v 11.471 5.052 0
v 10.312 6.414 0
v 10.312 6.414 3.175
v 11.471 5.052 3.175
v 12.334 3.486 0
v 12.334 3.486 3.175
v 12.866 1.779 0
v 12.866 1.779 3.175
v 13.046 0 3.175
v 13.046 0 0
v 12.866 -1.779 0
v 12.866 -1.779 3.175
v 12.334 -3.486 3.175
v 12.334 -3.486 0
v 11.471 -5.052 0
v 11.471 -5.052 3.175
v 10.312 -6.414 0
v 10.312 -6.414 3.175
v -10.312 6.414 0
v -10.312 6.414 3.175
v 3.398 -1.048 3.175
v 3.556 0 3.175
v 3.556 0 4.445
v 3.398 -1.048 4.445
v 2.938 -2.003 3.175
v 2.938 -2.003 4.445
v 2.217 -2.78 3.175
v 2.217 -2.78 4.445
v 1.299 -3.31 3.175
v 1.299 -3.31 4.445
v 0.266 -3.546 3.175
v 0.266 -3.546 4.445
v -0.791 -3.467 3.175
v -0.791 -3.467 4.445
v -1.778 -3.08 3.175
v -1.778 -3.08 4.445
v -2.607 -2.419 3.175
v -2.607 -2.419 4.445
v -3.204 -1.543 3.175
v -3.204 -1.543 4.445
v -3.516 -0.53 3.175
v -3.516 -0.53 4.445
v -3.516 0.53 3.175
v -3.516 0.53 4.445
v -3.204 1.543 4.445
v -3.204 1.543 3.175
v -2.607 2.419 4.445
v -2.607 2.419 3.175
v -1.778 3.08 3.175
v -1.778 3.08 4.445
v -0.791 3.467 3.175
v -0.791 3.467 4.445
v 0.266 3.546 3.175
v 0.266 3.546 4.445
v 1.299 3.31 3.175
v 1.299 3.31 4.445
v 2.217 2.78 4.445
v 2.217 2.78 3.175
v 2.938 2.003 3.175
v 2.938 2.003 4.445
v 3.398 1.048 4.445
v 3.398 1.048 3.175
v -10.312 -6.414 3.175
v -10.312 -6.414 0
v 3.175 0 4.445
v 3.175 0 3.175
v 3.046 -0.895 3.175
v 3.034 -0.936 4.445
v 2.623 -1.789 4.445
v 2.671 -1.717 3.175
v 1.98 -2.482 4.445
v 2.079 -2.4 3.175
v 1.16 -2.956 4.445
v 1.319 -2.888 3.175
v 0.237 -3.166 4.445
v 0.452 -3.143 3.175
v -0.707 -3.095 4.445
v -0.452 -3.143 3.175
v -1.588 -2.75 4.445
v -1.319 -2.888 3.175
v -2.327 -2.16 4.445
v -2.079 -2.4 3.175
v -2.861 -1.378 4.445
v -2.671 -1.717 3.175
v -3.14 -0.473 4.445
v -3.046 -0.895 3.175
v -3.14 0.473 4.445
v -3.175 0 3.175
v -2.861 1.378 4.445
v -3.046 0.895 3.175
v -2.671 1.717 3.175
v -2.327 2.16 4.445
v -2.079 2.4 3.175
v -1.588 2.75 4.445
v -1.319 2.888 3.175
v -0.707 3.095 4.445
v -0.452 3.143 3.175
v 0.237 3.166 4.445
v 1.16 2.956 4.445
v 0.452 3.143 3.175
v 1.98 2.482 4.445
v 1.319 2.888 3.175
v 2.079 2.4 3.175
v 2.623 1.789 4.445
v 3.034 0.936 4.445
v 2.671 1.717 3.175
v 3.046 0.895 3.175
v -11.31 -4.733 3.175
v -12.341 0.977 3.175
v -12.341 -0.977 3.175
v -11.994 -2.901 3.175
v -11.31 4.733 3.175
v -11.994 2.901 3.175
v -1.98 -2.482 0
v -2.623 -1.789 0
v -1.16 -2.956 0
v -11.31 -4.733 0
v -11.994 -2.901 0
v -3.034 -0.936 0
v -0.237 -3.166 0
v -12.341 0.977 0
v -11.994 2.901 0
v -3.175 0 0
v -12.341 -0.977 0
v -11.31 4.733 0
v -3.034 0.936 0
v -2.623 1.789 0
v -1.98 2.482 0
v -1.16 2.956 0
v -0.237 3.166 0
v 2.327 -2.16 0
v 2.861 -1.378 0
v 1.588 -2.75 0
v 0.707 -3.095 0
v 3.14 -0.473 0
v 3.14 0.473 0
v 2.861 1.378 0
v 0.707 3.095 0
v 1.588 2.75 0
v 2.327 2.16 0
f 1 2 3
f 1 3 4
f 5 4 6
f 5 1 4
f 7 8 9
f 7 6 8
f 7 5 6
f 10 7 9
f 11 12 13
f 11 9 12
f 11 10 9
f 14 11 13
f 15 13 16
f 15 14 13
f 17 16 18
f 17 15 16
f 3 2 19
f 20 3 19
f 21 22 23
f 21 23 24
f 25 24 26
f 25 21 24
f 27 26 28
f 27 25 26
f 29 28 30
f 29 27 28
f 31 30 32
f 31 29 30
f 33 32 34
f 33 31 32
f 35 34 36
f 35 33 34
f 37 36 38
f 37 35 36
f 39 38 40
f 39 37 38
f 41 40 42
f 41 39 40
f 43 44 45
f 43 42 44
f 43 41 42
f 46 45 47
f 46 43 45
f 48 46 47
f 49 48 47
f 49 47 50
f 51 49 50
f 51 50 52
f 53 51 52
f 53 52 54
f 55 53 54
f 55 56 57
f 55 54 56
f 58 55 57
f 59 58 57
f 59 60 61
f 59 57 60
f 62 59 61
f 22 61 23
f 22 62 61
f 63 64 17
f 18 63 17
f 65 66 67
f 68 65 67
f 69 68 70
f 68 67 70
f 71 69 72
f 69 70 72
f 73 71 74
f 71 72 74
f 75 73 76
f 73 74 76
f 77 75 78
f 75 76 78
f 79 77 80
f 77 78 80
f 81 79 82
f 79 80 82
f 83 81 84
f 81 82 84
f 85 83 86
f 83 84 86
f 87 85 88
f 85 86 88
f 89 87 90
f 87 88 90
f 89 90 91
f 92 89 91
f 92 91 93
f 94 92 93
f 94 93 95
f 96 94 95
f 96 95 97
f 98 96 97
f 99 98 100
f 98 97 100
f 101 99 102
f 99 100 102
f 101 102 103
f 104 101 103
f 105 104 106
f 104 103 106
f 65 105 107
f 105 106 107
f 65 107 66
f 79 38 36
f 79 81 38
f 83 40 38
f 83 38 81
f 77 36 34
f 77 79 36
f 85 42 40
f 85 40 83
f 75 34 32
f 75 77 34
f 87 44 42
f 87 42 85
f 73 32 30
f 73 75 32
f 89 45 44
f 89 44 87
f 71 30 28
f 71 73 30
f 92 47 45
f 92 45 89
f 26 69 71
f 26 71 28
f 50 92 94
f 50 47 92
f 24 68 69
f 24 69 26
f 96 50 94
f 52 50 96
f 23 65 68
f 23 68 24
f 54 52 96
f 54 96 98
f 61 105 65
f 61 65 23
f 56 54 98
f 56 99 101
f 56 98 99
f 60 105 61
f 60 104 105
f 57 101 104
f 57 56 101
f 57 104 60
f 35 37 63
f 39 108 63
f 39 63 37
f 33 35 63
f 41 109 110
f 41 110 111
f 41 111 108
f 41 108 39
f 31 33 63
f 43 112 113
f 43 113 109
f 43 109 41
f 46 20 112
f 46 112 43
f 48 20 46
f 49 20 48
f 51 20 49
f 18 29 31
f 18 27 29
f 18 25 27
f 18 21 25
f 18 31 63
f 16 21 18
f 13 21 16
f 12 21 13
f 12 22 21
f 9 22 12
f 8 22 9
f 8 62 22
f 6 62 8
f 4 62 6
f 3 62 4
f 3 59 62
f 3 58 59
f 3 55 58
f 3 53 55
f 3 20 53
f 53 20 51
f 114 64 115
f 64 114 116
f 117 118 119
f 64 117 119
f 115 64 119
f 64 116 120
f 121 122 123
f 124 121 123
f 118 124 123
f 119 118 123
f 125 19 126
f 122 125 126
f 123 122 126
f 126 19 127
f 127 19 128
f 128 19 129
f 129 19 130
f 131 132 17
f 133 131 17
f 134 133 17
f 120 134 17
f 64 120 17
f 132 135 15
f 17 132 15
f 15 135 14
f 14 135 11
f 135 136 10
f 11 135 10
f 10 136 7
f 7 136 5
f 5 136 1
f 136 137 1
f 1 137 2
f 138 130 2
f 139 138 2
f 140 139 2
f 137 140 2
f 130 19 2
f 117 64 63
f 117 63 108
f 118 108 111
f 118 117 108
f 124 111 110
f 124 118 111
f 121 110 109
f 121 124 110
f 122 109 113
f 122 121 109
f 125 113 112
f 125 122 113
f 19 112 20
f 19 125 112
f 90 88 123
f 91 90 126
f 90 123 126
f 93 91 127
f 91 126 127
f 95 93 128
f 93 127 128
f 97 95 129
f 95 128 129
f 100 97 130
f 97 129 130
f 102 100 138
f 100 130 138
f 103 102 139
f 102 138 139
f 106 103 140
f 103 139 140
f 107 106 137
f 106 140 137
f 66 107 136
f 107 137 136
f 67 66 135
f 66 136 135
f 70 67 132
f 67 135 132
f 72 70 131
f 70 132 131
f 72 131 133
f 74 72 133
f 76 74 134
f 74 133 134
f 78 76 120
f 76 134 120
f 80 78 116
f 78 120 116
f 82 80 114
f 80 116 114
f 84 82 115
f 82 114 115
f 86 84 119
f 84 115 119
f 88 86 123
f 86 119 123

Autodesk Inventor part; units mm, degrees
ref_plane "YZ Plane" through (0, 0, 0) normal (1, 0, 0) x (0, 1, 0)
ref_plane "XZ Plane" through (0, 0, 0) normal (0, 1, 0) x (-1, 0, 0)
ref_plane "XY Plane" through (0, 0, 0) normal (0, 0, 1) x (1, 0, 0)
sketch "Sketch1" plane through (0, 0, 0) normal (0, 0, 1) x (1, 0, 0)
  line L0 (-10.3124, -6.4135) -> (10.3124, -6.4135)
  line L1 (10.3124, -6.4135) -> (10.3124, 6.4135) construction
  line L2 (10.3124, 6.4135) -> (-10.3124, 6.4135)
  line L3 (-10.3124, 6.4135) -> (-10.3124, -6.4135) construction
  line L4 (-10.3124, -6.4135) -> (10.3124, 6.4135) construction
  line L5 (10.3124, -6.4135) -> (-10.3124, 6.4135) construction
  arc A0 (10.3124, -6.4135) -> (10.3124, 6.4135) centre (4.1562, 0) ccw
  arc A1 (-10.3124, 6.4135) -> (-10.3124, -6.4135) centre (-1.4224, 0) ccw
  point P0 (0, 0)
  dimension "d0" = 12.827
  dimension "d1" = 8.89
  dimension "d2" = 8.89
  dimension "d3" = 1.4224
extrude "Extrusion1" add sketch "Sketch1" along normal blind 3.175
sketch "Sketch2" plane through (0, 0, 0) normal (0, 0, -1) x (-1, 0, 0)
  circle A0 centre (0, 0) radius 3.175
  dimension "d6" = 6.35
extrude "Extrusion2" cut sketch "Sketch2" against normal blind 5.08
sketch "Sketch3" plane through (0, 0, 3.175) normal (0, 0, 1) x (1, 0, 0)
  circle A0 centre (0, 0) radius 3.175 projected
  circle A1 centre (0, 0) radius 3.556
  dimension "d9" = 7.112
extrude "Extrusion3" add sketch "Sketch3" along normal blind 1.27
thread "Thread1" size "1/4-20 UNC" class "2B" standard "ANSI Unified Screw Threads" full length
equation "\"d2\" = d1"
properties part number "3786_economy_slide_tnuts"
